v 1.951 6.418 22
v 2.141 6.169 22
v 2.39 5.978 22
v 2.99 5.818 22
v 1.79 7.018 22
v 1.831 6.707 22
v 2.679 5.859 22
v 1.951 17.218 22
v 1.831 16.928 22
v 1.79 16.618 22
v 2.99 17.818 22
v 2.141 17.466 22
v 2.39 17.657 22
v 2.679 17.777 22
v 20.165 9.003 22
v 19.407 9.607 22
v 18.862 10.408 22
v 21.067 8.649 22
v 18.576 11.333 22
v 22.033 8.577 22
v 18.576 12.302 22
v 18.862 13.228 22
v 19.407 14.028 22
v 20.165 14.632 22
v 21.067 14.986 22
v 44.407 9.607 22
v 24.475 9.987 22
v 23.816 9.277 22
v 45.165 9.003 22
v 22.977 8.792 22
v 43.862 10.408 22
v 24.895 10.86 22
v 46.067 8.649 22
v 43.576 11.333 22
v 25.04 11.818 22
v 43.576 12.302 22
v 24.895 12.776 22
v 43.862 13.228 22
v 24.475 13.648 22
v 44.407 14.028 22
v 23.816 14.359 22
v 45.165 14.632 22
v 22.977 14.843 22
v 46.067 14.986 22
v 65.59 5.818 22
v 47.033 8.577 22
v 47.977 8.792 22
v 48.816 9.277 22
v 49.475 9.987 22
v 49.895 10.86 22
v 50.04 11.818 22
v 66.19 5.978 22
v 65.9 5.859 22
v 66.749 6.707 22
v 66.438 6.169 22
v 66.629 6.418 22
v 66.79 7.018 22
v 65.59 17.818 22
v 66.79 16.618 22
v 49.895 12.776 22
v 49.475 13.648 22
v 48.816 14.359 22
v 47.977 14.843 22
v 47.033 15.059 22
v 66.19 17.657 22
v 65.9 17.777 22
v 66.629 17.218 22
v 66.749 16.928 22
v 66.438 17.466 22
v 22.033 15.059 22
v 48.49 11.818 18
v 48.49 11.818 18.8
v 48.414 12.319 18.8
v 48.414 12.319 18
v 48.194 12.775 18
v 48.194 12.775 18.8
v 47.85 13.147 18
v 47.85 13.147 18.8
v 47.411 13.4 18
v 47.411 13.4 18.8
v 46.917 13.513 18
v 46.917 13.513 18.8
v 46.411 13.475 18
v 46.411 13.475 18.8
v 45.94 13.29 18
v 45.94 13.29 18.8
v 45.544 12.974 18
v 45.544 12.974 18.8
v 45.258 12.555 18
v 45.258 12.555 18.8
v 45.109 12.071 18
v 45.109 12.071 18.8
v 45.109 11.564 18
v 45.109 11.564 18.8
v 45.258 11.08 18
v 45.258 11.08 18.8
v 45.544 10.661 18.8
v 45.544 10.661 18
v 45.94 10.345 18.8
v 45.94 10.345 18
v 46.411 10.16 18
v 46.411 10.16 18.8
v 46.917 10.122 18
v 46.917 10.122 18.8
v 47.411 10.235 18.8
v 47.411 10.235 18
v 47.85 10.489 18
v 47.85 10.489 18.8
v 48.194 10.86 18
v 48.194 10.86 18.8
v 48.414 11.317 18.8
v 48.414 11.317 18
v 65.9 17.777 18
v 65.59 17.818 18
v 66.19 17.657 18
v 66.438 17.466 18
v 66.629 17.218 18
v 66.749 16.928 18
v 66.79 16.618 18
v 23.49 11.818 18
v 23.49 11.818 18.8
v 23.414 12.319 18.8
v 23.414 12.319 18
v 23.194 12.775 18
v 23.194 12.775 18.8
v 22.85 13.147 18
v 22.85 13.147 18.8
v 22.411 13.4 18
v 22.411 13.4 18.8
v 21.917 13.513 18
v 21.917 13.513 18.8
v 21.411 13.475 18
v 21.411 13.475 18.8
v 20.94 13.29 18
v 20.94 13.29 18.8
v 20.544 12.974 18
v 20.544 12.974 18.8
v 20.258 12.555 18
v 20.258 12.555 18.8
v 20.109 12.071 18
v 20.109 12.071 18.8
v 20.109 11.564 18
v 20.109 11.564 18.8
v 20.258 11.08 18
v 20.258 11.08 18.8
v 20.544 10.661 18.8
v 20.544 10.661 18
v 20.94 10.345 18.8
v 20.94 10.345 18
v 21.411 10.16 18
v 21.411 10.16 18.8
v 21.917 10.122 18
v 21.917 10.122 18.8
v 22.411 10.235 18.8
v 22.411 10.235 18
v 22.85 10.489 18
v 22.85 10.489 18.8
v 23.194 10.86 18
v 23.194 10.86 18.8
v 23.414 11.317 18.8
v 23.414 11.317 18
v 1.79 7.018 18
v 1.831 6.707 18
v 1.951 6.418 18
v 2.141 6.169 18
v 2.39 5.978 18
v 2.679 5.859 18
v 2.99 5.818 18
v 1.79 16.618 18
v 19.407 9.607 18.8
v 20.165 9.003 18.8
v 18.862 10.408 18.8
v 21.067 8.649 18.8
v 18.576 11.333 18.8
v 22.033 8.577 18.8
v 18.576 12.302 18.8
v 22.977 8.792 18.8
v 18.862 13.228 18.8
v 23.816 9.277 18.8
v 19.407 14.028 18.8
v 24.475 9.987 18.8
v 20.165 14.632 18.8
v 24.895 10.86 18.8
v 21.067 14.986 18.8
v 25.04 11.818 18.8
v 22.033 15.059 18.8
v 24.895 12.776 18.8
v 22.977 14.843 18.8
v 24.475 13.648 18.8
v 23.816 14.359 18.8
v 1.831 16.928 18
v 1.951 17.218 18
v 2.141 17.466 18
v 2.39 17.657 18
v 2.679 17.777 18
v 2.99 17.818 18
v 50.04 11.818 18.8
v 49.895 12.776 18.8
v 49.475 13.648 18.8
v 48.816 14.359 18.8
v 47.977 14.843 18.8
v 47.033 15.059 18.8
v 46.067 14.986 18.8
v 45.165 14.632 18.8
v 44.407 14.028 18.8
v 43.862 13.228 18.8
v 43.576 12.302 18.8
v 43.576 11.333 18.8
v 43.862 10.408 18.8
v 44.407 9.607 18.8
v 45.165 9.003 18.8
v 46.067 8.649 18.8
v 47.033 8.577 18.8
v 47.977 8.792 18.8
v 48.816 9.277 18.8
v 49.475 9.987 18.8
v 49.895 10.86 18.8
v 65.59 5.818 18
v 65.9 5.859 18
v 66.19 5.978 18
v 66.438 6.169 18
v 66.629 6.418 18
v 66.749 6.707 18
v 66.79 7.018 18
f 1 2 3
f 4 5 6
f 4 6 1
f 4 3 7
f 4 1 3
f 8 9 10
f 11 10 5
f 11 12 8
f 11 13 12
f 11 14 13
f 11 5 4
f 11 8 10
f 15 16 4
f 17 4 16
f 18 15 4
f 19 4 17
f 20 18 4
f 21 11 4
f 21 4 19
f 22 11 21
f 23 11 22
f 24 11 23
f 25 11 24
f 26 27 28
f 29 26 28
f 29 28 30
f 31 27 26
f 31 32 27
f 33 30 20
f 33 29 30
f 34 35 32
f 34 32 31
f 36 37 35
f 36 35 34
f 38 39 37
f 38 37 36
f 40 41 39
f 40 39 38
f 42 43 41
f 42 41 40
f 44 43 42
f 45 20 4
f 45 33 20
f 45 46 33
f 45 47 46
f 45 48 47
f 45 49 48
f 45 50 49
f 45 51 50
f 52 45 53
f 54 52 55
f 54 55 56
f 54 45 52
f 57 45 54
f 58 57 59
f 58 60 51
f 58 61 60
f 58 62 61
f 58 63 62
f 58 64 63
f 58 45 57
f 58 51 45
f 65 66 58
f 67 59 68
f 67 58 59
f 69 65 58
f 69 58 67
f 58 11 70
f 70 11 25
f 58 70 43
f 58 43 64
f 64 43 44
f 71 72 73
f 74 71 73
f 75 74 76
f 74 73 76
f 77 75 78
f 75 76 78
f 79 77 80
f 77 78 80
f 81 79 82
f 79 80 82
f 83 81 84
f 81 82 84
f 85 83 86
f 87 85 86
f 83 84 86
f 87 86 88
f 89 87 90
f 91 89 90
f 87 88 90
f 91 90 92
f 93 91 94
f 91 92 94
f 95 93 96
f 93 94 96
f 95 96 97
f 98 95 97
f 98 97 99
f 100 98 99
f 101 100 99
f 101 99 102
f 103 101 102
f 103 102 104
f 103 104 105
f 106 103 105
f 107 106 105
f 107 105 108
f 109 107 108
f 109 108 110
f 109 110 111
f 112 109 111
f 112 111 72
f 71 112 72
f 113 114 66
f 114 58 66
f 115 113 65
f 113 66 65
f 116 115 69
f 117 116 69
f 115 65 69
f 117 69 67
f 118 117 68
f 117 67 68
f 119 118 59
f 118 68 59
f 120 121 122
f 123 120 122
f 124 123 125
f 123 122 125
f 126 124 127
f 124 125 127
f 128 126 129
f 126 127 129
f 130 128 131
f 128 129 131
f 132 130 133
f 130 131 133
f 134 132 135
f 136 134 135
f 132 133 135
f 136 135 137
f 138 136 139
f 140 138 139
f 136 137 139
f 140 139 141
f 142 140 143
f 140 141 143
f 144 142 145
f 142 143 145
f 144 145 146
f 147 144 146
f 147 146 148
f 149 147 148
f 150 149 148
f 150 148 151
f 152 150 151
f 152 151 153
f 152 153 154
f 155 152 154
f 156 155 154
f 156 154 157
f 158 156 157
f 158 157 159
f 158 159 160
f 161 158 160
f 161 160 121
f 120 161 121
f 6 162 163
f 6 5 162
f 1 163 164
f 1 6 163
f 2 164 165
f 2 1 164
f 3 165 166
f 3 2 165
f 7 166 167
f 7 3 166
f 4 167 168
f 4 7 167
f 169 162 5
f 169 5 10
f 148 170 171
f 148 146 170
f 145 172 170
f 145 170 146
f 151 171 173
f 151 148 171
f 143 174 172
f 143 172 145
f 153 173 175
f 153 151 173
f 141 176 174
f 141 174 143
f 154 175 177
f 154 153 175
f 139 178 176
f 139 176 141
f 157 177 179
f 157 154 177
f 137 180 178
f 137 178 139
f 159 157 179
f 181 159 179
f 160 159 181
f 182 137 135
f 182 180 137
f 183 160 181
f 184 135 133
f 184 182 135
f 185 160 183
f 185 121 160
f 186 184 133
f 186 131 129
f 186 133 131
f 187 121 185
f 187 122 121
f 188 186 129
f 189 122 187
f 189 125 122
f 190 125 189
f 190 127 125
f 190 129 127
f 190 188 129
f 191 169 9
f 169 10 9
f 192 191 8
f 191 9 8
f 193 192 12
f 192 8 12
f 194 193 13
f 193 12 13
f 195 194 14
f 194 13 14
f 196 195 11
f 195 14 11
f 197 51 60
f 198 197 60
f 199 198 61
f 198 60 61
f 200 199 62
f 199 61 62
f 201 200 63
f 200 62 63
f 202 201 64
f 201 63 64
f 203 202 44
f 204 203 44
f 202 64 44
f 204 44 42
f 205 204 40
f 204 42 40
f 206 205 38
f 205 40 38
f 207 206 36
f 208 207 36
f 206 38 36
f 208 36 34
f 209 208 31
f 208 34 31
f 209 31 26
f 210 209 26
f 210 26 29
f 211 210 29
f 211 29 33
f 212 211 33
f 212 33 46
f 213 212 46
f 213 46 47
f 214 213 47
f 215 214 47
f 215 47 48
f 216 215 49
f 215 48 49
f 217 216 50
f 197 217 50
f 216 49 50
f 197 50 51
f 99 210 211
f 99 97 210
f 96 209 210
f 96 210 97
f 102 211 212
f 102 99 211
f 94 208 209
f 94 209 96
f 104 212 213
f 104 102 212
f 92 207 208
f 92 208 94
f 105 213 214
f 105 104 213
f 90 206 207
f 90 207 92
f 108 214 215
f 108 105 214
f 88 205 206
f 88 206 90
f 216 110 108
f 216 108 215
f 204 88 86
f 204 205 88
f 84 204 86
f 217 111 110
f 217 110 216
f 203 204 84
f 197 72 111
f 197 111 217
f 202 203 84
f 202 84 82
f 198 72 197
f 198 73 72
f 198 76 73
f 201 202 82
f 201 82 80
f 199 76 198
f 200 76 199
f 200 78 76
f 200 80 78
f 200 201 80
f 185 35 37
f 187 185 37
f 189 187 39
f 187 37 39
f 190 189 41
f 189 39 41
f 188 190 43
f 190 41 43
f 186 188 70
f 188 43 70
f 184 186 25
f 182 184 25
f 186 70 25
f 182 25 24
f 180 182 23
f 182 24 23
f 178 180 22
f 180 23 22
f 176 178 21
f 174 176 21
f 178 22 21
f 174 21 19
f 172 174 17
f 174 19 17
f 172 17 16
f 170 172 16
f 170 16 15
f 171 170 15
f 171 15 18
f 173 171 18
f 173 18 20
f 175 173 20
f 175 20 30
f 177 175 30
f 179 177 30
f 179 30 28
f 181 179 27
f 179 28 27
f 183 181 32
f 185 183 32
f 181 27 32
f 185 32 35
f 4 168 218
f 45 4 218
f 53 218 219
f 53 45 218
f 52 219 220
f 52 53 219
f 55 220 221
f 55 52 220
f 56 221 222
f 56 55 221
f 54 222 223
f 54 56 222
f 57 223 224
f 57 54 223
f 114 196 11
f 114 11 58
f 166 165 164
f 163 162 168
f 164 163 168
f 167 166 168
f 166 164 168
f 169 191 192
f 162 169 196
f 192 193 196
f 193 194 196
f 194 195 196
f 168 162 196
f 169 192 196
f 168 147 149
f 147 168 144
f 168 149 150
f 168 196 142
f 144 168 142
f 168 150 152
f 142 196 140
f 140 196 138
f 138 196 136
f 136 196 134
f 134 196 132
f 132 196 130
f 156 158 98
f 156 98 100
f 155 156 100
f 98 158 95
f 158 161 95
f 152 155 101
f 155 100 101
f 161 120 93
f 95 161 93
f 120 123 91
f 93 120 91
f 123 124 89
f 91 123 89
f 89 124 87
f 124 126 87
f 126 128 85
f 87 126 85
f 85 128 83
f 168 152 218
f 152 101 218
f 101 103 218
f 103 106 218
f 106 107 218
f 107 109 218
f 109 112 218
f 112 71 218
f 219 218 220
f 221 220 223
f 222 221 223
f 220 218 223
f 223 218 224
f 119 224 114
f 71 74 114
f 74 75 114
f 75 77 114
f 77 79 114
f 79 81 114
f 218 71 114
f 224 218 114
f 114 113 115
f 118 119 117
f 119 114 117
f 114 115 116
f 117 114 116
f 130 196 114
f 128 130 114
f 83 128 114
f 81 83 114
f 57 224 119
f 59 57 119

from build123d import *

# Parameters (mm, degrees)
SKIZZE2_W                       = 65
SKIZZE2_H                       = 12
AUFSATZ_LINEAR_AUSTRAGEN1_DEPTH = 4
SKIZZE3_R                       = 1.7
SCHNITT_LINEAR_AUSTRAGEN1_DEPTH = 70.241173381
SKIZZE4_R                       = 3.25
SCHNITT_LINEAR_AUSTRAGEN2_DEPTH = 3.2
VERRUNDUNG3_R                   = 1.2


with BuildPart() as part:
    # Skizze2 → Aufsatz-Linear austragen1 (new body)
    with BuildSketch(Plane.XY.offset(18)):
        with Locations((34.289745228, 11.817688499)):
            Rectangle(SKIZZE2_W, SKIZZE2_H)
    extrude(amount=AUFSATZ_LINEAR_AUSTRAGEN1_DEPTH)

    # Skizze3 → Schnitt-Linear austragen1 (cut, through all)
    with BuildSketch(Plane.XY.offset(22)):
        with Locations((21.789745228, 11.817688499)):
            Circle(SKIZZE3_R)
        with Locations((46.789745228, 11.817688499)):
            Circle(SKIZZE3_R)
    extrude(amount=-SCHNITT_LINEAR_AUSTRAGEN1_DEPTH, mode=Mode.SUBTRACT)

    # Skizze4 → Schnitt-Linear austragen2 (cut)
    with BuildSketch(Plane.XY.offset(22)):
        with Locations((21.789745228, 11.817688499)):
            Circle(SKIZZE4_R)
        with Locations((46.789745228, 11.817688499)):
            Circle(SKIZZE4_R)
    extrude(amount=-SCHNITT_LINEAR_AUSTRAGEN2_DEPTH, mode=Mode.SUBTRACT)

    # Verrundung3
    verrundung3_edges = [part.edges().sort_by_distance(p)[0] for p in [
        (1.789745228, 17.817688499, 20),
        (66.789745228, 17.817688499, 20),
        (66.789745228, 5.817688499, 20),
        (1.789745228, 5.817688499, 20),
    ]]
    fillet(verrundung3_edges, radius=VERRUNDUNG3_R)


solid = part.part
